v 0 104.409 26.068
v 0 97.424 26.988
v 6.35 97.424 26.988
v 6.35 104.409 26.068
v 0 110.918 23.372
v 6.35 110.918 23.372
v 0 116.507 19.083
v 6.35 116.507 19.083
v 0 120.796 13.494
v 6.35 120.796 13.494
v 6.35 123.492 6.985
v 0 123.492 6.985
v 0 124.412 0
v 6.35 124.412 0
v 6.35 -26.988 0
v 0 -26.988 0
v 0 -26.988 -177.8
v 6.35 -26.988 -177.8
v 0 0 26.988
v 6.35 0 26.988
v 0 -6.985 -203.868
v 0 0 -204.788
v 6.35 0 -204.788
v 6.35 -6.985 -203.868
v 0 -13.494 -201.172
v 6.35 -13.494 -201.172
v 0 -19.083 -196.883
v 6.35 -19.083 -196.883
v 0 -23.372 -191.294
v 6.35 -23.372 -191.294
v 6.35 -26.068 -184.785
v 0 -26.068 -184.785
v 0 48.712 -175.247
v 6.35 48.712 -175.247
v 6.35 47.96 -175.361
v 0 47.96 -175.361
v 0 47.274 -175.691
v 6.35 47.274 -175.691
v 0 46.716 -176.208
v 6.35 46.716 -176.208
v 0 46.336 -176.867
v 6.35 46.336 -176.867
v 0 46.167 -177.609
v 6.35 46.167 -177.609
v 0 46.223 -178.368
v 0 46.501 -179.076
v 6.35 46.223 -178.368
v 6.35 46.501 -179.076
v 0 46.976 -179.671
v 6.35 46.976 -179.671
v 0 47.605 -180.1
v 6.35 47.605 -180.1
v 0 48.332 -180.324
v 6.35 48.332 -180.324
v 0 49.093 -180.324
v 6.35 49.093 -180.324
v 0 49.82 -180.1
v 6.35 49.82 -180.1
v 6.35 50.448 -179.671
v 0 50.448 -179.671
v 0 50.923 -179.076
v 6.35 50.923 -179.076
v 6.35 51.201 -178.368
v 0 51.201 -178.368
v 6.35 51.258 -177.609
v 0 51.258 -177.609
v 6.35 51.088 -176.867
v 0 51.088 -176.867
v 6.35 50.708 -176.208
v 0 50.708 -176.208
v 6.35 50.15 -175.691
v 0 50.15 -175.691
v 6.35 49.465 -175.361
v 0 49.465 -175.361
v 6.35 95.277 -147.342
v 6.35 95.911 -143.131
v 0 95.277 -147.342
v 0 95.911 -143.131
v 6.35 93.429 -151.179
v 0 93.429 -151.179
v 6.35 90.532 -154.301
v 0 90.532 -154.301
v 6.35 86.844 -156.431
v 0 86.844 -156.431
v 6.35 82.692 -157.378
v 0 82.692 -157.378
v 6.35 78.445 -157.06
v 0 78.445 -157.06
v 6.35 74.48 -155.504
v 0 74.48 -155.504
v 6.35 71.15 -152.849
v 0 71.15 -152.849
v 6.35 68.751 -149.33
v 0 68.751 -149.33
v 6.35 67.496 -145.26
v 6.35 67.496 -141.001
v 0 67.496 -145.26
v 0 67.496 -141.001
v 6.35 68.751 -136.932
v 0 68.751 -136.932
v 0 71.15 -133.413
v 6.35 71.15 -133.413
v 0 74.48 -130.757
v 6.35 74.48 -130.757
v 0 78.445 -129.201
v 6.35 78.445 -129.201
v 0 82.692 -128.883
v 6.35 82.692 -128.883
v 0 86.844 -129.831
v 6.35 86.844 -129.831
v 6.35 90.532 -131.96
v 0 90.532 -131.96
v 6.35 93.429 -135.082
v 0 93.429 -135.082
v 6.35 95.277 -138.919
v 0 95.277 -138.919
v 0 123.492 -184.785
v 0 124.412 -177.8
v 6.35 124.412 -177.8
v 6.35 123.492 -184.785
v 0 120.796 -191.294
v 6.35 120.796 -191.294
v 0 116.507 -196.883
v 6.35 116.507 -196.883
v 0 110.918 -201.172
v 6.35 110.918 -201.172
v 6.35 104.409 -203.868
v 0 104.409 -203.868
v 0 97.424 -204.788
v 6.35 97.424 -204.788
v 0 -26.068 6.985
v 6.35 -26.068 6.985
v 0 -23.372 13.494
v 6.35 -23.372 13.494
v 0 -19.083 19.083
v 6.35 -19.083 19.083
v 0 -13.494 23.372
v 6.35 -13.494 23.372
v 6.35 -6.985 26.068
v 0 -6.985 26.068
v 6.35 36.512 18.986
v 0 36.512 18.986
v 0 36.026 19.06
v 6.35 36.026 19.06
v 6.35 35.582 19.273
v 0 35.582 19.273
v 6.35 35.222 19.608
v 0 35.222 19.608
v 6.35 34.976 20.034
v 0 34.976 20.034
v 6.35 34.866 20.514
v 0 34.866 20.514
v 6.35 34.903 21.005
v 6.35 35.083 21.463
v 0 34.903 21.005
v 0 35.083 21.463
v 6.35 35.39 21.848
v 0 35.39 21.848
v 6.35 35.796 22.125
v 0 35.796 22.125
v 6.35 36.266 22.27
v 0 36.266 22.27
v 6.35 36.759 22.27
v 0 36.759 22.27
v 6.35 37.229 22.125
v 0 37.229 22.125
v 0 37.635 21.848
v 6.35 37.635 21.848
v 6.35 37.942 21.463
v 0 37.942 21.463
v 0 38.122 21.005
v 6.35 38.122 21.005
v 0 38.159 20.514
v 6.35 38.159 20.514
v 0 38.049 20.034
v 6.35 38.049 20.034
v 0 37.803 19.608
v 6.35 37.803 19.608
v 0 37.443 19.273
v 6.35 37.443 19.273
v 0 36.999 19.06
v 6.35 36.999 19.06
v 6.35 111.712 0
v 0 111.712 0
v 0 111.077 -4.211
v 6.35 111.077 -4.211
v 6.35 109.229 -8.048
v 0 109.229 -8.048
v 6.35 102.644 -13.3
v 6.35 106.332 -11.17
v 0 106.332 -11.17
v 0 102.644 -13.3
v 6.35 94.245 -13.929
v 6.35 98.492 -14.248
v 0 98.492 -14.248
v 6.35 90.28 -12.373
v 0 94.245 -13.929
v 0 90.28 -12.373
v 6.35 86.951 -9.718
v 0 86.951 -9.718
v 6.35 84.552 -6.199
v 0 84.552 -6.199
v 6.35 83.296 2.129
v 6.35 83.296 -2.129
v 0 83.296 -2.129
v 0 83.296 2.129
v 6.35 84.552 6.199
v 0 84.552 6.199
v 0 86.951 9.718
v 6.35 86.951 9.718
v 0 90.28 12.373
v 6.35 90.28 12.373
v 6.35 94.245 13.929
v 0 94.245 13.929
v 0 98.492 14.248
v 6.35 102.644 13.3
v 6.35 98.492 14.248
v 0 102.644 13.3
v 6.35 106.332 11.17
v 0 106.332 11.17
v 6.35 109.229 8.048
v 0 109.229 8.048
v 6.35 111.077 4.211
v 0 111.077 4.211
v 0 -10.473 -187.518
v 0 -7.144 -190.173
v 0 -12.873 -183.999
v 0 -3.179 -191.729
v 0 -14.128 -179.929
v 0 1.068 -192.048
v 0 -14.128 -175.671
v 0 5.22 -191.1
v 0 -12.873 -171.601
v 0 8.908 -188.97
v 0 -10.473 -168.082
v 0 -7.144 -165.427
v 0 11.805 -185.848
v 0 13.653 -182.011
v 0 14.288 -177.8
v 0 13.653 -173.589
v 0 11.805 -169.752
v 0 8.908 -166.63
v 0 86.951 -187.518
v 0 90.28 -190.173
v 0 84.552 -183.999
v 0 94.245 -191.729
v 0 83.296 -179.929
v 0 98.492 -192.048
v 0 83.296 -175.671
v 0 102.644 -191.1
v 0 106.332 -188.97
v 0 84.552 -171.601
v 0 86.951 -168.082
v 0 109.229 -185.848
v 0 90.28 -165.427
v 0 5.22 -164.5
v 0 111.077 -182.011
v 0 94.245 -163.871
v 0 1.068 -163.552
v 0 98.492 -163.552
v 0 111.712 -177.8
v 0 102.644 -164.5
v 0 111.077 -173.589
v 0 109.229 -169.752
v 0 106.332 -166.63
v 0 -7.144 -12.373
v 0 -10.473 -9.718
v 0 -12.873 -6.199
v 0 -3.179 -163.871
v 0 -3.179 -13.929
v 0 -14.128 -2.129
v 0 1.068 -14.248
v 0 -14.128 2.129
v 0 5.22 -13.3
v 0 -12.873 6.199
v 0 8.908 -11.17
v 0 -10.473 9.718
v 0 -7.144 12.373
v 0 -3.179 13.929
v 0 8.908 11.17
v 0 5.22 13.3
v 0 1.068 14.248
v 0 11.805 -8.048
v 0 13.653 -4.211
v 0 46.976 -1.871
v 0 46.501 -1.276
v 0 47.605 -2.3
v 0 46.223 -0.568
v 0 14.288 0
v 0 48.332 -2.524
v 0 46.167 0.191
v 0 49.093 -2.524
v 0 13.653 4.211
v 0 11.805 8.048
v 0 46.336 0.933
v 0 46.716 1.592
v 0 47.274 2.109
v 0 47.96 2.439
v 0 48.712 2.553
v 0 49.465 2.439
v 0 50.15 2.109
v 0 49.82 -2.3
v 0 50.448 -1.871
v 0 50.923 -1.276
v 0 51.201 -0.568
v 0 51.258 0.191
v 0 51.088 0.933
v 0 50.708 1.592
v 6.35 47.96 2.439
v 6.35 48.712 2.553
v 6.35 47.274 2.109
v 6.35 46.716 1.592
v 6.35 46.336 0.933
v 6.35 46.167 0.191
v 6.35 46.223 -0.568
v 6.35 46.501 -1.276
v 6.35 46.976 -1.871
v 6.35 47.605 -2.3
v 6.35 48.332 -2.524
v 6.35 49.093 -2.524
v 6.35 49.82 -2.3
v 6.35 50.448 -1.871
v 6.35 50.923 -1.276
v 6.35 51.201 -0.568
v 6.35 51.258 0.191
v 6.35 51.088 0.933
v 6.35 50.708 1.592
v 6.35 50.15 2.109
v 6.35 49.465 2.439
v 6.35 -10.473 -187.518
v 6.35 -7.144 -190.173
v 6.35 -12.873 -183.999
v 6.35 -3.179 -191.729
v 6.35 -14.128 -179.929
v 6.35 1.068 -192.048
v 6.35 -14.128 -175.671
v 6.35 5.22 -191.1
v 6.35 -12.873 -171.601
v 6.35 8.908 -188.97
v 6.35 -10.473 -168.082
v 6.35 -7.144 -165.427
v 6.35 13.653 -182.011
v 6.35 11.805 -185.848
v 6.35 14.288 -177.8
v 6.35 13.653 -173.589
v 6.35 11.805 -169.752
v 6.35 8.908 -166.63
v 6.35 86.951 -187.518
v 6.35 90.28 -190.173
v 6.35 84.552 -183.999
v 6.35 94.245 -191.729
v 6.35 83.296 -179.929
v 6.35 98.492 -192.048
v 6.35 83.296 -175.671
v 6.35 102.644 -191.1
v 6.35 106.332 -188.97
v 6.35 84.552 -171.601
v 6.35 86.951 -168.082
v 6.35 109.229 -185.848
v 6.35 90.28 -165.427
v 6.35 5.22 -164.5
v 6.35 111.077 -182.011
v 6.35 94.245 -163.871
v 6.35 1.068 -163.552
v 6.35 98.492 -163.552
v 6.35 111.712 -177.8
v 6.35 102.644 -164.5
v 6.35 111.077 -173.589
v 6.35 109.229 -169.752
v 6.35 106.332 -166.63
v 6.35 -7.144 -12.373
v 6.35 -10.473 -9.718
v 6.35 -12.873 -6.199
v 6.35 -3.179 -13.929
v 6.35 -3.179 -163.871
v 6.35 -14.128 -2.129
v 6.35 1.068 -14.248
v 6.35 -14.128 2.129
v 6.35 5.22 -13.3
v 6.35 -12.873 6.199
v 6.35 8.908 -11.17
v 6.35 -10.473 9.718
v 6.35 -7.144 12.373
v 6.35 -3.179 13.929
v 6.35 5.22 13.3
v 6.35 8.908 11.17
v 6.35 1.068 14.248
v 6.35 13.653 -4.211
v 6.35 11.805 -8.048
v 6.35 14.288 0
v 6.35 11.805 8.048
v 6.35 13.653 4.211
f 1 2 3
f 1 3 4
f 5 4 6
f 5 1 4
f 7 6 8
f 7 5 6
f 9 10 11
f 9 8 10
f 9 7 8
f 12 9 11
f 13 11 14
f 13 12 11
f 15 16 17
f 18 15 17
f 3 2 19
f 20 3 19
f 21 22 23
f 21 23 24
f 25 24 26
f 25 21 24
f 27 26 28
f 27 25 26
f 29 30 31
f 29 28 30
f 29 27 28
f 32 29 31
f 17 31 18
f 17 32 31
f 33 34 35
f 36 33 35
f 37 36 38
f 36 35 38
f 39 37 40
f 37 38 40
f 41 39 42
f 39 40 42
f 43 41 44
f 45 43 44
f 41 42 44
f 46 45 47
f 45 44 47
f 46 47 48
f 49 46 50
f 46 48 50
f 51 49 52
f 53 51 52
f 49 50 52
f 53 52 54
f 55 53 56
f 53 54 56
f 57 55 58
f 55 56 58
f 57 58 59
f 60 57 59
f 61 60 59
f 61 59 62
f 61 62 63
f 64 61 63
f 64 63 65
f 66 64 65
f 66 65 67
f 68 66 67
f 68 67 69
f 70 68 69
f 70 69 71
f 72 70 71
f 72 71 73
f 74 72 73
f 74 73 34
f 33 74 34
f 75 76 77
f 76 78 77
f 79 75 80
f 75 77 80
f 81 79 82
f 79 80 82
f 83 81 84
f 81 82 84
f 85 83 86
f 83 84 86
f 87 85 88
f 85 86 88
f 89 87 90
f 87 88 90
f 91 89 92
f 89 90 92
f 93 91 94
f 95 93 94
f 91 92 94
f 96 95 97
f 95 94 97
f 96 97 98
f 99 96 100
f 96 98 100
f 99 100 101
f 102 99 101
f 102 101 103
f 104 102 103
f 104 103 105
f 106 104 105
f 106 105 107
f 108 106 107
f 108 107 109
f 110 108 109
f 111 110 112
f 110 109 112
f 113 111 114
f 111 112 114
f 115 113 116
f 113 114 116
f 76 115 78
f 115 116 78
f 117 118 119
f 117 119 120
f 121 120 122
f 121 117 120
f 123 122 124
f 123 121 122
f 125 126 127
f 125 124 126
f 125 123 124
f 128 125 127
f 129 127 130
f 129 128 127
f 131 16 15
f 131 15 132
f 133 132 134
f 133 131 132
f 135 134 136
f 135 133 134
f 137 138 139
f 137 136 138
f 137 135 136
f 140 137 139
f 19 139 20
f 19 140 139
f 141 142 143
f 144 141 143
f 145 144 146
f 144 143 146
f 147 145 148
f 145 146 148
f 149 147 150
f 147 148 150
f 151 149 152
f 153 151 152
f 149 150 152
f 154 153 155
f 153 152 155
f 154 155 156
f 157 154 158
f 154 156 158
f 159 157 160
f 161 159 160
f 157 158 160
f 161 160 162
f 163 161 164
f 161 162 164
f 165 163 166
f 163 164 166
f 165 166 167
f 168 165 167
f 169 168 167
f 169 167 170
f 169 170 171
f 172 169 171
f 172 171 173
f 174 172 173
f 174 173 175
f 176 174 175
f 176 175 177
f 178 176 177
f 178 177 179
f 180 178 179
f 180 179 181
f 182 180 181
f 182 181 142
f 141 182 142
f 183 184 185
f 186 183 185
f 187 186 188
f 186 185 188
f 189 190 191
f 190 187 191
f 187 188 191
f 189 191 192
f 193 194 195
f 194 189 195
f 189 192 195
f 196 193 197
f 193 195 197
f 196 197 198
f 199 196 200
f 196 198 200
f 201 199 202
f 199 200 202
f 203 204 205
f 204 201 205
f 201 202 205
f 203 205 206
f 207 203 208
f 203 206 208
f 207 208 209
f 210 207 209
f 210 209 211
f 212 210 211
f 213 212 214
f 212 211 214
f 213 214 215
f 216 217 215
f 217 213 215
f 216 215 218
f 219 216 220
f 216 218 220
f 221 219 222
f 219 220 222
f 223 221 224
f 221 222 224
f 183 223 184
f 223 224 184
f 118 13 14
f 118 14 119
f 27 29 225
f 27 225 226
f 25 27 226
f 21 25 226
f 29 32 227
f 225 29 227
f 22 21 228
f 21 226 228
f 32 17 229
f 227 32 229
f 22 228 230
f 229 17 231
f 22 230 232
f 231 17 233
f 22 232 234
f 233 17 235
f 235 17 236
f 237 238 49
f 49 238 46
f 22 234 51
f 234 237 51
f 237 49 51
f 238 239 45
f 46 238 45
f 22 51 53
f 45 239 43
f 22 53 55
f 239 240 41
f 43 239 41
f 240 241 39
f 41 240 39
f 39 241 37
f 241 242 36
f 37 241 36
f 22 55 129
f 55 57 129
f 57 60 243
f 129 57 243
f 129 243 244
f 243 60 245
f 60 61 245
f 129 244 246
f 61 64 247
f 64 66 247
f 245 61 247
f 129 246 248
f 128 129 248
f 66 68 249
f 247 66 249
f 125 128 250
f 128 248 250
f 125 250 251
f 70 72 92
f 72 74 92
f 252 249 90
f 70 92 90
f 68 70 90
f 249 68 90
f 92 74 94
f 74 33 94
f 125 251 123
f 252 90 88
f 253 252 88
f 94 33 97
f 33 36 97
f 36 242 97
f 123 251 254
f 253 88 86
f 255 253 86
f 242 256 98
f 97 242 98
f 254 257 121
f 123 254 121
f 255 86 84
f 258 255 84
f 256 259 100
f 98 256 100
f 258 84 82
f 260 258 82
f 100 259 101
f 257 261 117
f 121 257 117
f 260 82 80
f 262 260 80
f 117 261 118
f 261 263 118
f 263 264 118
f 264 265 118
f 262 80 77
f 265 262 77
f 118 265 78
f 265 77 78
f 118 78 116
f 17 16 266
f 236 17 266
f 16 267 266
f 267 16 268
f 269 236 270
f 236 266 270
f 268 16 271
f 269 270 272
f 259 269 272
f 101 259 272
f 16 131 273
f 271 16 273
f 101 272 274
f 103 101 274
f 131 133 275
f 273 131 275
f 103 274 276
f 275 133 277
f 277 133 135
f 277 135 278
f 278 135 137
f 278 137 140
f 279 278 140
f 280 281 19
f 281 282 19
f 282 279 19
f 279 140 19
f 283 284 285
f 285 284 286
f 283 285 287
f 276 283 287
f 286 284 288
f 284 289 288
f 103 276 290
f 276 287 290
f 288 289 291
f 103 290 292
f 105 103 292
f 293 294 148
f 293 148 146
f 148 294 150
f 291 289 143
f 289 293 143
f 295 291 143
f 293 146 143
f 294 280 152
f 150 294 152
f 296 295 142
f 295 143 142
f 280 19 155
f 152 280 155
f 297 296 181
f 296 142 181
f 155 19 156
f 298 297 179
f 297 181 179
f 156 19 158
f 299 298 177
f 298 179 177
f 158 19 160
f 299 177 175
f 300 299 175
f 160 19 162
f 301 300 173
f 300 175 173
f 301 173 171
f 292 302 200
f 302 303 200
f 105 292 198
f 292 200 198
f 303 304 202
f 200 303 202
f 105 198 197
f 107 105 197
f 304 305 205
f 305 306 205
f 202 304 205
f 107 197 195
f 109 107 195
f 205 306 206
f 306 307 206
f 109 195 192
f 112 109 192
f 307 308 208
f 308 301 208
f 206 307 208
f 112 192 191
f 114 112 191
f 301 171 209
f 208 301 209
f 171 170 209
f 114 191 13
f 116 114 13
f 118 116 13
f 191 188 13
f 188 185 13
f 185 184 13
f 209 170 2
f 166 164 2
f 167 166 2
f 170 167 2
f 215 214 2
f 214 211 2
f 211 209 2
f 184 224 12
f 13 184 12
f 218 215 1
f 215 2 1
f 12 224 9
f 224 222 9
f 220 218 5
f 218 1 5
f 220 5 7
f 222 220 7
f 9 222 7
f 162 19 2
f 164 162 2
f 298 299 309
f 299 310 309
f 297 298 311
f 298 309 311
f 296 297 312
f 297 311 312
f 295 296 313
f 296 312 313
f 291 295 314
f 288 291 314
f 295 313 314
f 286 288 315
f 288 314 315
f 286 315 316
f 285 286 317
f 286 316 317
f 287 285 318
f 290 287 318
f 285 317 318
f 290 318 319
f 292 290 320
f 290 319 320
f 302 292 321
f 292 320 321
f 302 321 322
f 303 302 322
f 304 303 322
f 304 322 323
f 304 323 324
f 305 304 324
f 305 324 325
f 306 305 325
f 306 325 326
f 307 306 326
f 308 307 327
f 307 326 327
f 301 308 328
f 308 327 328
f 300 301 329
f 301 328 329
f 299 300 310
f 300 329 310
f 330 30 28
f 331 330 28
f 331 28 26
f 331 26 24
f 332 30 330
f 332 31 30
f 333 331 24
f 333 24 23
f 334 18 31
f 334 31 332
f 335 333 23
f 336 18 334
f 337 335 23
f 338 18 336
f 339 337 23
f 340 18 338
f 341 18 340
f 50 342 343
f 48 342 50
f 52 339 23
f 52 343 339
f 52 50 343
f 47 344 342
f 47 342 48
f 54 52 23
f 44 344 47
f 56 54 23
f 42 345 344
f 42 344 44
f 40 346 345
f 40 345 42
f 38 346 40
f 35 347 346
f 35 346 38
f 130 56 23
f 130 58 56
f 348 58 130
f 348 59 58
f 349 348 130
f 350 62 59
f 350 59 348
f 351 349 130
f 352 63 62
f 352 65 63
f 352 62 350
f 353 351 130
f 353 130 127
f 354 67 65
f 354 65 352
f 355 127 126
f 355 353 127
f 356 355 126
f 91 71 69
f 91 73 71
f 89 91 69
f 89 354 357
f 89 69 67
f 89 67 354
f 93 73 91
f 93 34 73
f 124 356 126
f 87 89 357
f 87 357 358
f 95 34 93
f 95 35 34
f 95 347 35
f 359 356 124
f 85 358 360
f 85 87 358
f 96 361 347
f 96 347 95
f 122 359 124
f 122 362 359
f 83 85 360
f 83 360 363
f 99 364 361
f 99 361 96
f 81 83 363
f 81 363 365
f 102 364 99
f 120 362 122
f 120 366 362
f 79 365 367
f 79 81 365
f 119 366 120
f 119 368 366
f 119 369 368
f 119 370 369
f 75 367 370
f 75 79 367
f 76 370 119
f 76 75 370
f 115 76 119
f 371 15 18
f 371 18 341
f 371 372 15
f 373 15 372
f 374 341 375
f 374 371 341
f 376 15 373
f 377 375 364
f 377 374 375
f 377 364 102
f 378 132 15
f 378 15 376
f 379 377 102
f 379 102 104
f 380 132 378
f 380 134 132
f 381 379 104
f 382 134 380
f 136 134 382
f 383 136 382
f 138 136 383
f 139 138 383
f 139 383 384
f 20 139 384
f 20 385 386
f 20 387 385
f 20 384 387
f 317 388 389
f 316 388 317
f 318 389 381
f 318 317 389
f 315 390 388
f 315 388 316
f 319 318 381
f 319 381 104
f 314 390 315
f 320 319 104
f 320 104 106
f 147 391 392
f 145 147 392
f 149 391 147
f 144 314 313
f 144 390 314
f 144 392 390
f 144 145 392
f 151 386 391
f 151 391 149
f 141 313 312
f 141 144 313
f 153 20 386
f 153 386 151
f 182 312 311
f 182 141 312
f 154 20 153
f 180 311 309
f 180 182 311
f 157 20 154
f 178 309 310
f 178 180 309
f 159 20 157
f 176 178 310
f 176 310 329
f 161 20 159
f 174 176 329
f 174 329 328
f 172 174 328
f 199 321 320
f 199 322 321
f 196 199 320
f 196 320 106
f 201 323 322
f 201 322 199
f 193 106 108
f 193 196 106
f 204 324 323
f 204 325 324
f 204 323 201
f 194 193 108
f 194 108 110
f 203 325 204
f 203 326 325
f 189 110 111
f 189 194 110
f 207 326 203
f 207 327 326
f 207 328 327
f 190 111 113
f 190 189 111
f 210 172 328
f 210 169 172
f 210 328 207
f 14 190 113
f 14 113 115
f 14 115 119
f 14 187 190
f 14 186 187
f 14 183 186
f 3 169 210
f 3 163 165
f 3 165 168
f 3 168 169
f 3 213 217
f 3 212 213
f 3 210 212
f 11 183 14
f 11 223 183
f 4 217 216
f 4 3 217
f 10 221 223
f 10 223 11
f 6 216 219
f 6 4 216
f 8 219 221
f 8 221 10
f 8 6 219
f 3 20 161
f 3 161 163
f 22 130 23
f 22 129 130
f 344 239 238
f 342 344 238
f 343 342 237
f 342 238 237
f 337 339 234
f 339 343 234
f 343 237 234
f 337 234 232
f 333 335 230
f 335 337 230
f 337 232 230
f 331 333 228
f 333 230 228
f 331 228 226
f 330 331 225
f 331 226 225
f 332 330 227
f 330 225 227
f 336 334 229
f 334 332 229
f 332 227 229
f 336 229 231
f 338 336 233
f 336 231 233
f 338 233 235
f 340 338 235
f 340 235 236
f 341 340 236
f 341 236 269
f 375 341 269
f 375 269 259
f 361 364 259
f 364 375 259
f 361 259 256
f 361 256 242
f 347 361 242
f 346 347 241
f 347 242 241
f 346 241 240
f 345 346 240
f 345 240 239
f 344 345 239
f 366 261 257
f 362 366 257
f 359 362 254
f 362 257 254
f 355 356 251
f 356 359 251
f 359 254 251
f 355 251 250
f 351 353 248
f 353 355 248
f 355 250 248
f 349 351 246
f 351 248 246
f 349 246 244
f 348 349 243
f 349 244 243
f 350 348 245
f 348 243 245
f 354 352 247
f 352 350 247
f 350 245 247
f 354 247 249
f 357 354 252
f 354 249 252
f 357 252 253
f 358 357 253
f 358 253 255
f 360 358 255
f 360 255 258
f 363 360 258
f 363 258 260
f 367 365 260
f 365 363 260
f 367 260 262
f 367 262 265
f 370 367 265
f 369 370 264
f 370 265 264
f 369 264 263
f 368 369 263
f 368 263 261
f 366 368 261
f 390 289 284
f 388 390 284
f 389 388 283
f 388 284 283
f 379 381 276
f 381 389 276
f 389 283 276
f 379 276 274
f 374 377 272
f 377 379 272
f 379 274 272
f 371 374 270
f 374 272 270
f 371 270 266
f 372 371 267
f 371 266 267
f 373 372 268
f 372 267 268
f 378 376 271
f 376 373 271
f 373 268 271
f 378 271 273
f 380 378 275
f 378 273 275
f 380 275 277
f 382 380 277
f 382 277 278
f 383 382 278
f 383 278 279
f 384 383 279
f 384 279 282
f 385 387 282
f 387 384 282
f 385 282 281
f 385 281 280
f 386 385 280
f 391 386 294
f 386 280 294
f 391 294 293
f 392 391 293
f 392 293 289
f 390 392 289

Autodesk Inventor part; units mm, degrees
ref_plane "YZ Plane" through (0, 0, 0) normal (1, 0, 0) x (0, 1, 0)
ref_plane "XZ Plane" through (0, 0, 0) normal (0, 1, 0) x (-1, 0, 0)
ref_plane "XY Plane" through (0, 0, 0) normal (0, 0, 1) x (1, 0, 0)
sketch "Sketch1" plane through (0, 0, 0) normal (1, 0, 0) x (0, 1, 0)
  circle A0 centre (0, 0) radius 14.2875
  circle A1 centre (0, -177.8) radius 14.2875
  line L0 (152.4, -31.75) -> (-152.4, -31.75) construction
  line L1 (-152.4, -31.75) -> (-152.4, -146.05) construction
  line L2 (-152.4, -146.05) -> (152.4, -146.05) construction
  line L3 (152.4, -146.05) -> (152.4, -31.75) construction
  line L4 (152.4, -31.75) -> (-152.4, -146.05) construction
  line L5 (-152.4, -31.75) -> (152.4, -146.05) construction
  circle A2 centre (0, 0) radius 38.1 construction
  circle A3 centre (0, -177.8) radius 38.1 construction
  circle A4 centre (0, 0) radius 31.75 construction
  circle A5 centre (0, -177.8) radius 31.75 construction
  circle A6 centre (0, 0) radius 26.9875 construction
  circle A7 centre (0, -177.8) radius 26.9875 construction
  circle A8 centre (97.4242, -177.8) radius 14.2875
  circle A9 centre (97.4242, -177.8) radius 38.1 construction
  circle A10 centre (97.4242, -177.8) radius 31.75 construction
  circle A11 centre (97.4242, -177.8) radius 26.9875 construction
  circle A12 centre (97.4242, 0) radius 14.2875
  circle A13 centre (97.4242, 0) radius 38.1 construction
  circle A14 centre (97.4242, 0) radius 31.75 construction
  circle A15 centre (97.4242, 0) radius 26.9875 construction
  line L6 (97.4242, -204.7875) -> (0, -204.7875)
  line L7 (97.4242, 26.9875) -> (0, 26.9875)
  line L8 (124.4117, 0) -> (124.4117, -177.8)
  line L9 (-26.9875, 0) -> (-26.9875, -177.8)
  arc A16 (124.4117, 0) -> (97.4242, 26.9875) centre (97.4242, 0) ccw
  arc A17 (97.4242, -204.7875) -> (124.4117, -177.8) centre (97.4242, -177.8) ccw
  arc A18 (0, 26.9875) -> (-26.9875, 0) centre (0, 0) ccw
  arc A19 (-26.9875, -177.8) -> (0, -204.7875) centre (0, -177.8) ccw
  line L10 (97.4242, -177.8) -> (0, -177.8) construction
  circle A20 centre (81.6238, -143.1307) radius 14.2875
  circle A21 centre (97.4242, -177.8) radius 19.05 construction
  circle A22 centre (81.6238, -143.1307) radius 19.05 construction
  point P0 (0, -88.9)
  point P1 (48.7121, 0)
  point P2 (48.7121, -177.8)
  point P3 (48.7121, -177.8)
  dimension "d0" = 28.575
  dimension "d2" = 304.8
  dimension "d3" = 114.3
  dimension "d4" = 76.2
  dimension "d6" = 6.35
  dimension "d7" = 12.7
  dimension "d8" = 97.4242
  dimension "d38" = 177.8
  dimension "d40" = 38.1
  dimension "d41" = 144.0002
extrude "Extrusion1" add sketch "Sketch1" along normal blind 6.35 contours L6 A19 L9 A18 L7 A16 L8 A17 | A20
hole "Hole1" at (0, 48.7121, 0) at (0, 48.7121, -177.8) direction (1, 0, 0) diameter 5.1054 end through all clearance for "Flat Head Machine Screw (82)" size "#10" standard "Ansi Unified Screw Threads"
sketch "Sketch3" plane through (6.35, 0, 0) normal (1, 0, 0) x (0, 0, -1)
  line L0 (-26.9875, 97.4242) -> (-26.9875, 0) construction
  line L1 (0, -26.9875) -> (177.8, -26.9875) construction
  point P0 (0, 0)
  point P1 (-20.6375, 36.5125)
  dimension "d29" = 6.35
  dimension "d30" = 63.5
hole "Hole2" at (6.35, 36.5125, 20.6375) direction (-1, 0, 0) diameter 3.302 end through all thread size "8-32 UNC" class "2B" standard "ANSI Unified Screw Threads"
extrude "Extrusion2" cut sketch "Sketch1" along normal through all contours A20
equation "\"d36\" = Thickness"
equation "\"BendRadius\" = Thickness"
equation "\"BendReliefWidth\" = Thickness"
equation "\"BendReliefDepth\" = 0.5 * Thickness"
equation "\"CornerReliefSize\" = 4 * Thickness"
equation "\"MinimumRemnant\" = 2 * Thickness"
equation "\"TransitionRadius\" = BendRadius"
equation "\"JacobiRadiusSize\" = BendRadius"
equation "\"GapSize\" = Thickness"
equation "\"d18\" = Thickness"
equation "\"Thickness\" = 6.35"
properties part number "GP4-006" material "Polycarbonate, Smoke"
